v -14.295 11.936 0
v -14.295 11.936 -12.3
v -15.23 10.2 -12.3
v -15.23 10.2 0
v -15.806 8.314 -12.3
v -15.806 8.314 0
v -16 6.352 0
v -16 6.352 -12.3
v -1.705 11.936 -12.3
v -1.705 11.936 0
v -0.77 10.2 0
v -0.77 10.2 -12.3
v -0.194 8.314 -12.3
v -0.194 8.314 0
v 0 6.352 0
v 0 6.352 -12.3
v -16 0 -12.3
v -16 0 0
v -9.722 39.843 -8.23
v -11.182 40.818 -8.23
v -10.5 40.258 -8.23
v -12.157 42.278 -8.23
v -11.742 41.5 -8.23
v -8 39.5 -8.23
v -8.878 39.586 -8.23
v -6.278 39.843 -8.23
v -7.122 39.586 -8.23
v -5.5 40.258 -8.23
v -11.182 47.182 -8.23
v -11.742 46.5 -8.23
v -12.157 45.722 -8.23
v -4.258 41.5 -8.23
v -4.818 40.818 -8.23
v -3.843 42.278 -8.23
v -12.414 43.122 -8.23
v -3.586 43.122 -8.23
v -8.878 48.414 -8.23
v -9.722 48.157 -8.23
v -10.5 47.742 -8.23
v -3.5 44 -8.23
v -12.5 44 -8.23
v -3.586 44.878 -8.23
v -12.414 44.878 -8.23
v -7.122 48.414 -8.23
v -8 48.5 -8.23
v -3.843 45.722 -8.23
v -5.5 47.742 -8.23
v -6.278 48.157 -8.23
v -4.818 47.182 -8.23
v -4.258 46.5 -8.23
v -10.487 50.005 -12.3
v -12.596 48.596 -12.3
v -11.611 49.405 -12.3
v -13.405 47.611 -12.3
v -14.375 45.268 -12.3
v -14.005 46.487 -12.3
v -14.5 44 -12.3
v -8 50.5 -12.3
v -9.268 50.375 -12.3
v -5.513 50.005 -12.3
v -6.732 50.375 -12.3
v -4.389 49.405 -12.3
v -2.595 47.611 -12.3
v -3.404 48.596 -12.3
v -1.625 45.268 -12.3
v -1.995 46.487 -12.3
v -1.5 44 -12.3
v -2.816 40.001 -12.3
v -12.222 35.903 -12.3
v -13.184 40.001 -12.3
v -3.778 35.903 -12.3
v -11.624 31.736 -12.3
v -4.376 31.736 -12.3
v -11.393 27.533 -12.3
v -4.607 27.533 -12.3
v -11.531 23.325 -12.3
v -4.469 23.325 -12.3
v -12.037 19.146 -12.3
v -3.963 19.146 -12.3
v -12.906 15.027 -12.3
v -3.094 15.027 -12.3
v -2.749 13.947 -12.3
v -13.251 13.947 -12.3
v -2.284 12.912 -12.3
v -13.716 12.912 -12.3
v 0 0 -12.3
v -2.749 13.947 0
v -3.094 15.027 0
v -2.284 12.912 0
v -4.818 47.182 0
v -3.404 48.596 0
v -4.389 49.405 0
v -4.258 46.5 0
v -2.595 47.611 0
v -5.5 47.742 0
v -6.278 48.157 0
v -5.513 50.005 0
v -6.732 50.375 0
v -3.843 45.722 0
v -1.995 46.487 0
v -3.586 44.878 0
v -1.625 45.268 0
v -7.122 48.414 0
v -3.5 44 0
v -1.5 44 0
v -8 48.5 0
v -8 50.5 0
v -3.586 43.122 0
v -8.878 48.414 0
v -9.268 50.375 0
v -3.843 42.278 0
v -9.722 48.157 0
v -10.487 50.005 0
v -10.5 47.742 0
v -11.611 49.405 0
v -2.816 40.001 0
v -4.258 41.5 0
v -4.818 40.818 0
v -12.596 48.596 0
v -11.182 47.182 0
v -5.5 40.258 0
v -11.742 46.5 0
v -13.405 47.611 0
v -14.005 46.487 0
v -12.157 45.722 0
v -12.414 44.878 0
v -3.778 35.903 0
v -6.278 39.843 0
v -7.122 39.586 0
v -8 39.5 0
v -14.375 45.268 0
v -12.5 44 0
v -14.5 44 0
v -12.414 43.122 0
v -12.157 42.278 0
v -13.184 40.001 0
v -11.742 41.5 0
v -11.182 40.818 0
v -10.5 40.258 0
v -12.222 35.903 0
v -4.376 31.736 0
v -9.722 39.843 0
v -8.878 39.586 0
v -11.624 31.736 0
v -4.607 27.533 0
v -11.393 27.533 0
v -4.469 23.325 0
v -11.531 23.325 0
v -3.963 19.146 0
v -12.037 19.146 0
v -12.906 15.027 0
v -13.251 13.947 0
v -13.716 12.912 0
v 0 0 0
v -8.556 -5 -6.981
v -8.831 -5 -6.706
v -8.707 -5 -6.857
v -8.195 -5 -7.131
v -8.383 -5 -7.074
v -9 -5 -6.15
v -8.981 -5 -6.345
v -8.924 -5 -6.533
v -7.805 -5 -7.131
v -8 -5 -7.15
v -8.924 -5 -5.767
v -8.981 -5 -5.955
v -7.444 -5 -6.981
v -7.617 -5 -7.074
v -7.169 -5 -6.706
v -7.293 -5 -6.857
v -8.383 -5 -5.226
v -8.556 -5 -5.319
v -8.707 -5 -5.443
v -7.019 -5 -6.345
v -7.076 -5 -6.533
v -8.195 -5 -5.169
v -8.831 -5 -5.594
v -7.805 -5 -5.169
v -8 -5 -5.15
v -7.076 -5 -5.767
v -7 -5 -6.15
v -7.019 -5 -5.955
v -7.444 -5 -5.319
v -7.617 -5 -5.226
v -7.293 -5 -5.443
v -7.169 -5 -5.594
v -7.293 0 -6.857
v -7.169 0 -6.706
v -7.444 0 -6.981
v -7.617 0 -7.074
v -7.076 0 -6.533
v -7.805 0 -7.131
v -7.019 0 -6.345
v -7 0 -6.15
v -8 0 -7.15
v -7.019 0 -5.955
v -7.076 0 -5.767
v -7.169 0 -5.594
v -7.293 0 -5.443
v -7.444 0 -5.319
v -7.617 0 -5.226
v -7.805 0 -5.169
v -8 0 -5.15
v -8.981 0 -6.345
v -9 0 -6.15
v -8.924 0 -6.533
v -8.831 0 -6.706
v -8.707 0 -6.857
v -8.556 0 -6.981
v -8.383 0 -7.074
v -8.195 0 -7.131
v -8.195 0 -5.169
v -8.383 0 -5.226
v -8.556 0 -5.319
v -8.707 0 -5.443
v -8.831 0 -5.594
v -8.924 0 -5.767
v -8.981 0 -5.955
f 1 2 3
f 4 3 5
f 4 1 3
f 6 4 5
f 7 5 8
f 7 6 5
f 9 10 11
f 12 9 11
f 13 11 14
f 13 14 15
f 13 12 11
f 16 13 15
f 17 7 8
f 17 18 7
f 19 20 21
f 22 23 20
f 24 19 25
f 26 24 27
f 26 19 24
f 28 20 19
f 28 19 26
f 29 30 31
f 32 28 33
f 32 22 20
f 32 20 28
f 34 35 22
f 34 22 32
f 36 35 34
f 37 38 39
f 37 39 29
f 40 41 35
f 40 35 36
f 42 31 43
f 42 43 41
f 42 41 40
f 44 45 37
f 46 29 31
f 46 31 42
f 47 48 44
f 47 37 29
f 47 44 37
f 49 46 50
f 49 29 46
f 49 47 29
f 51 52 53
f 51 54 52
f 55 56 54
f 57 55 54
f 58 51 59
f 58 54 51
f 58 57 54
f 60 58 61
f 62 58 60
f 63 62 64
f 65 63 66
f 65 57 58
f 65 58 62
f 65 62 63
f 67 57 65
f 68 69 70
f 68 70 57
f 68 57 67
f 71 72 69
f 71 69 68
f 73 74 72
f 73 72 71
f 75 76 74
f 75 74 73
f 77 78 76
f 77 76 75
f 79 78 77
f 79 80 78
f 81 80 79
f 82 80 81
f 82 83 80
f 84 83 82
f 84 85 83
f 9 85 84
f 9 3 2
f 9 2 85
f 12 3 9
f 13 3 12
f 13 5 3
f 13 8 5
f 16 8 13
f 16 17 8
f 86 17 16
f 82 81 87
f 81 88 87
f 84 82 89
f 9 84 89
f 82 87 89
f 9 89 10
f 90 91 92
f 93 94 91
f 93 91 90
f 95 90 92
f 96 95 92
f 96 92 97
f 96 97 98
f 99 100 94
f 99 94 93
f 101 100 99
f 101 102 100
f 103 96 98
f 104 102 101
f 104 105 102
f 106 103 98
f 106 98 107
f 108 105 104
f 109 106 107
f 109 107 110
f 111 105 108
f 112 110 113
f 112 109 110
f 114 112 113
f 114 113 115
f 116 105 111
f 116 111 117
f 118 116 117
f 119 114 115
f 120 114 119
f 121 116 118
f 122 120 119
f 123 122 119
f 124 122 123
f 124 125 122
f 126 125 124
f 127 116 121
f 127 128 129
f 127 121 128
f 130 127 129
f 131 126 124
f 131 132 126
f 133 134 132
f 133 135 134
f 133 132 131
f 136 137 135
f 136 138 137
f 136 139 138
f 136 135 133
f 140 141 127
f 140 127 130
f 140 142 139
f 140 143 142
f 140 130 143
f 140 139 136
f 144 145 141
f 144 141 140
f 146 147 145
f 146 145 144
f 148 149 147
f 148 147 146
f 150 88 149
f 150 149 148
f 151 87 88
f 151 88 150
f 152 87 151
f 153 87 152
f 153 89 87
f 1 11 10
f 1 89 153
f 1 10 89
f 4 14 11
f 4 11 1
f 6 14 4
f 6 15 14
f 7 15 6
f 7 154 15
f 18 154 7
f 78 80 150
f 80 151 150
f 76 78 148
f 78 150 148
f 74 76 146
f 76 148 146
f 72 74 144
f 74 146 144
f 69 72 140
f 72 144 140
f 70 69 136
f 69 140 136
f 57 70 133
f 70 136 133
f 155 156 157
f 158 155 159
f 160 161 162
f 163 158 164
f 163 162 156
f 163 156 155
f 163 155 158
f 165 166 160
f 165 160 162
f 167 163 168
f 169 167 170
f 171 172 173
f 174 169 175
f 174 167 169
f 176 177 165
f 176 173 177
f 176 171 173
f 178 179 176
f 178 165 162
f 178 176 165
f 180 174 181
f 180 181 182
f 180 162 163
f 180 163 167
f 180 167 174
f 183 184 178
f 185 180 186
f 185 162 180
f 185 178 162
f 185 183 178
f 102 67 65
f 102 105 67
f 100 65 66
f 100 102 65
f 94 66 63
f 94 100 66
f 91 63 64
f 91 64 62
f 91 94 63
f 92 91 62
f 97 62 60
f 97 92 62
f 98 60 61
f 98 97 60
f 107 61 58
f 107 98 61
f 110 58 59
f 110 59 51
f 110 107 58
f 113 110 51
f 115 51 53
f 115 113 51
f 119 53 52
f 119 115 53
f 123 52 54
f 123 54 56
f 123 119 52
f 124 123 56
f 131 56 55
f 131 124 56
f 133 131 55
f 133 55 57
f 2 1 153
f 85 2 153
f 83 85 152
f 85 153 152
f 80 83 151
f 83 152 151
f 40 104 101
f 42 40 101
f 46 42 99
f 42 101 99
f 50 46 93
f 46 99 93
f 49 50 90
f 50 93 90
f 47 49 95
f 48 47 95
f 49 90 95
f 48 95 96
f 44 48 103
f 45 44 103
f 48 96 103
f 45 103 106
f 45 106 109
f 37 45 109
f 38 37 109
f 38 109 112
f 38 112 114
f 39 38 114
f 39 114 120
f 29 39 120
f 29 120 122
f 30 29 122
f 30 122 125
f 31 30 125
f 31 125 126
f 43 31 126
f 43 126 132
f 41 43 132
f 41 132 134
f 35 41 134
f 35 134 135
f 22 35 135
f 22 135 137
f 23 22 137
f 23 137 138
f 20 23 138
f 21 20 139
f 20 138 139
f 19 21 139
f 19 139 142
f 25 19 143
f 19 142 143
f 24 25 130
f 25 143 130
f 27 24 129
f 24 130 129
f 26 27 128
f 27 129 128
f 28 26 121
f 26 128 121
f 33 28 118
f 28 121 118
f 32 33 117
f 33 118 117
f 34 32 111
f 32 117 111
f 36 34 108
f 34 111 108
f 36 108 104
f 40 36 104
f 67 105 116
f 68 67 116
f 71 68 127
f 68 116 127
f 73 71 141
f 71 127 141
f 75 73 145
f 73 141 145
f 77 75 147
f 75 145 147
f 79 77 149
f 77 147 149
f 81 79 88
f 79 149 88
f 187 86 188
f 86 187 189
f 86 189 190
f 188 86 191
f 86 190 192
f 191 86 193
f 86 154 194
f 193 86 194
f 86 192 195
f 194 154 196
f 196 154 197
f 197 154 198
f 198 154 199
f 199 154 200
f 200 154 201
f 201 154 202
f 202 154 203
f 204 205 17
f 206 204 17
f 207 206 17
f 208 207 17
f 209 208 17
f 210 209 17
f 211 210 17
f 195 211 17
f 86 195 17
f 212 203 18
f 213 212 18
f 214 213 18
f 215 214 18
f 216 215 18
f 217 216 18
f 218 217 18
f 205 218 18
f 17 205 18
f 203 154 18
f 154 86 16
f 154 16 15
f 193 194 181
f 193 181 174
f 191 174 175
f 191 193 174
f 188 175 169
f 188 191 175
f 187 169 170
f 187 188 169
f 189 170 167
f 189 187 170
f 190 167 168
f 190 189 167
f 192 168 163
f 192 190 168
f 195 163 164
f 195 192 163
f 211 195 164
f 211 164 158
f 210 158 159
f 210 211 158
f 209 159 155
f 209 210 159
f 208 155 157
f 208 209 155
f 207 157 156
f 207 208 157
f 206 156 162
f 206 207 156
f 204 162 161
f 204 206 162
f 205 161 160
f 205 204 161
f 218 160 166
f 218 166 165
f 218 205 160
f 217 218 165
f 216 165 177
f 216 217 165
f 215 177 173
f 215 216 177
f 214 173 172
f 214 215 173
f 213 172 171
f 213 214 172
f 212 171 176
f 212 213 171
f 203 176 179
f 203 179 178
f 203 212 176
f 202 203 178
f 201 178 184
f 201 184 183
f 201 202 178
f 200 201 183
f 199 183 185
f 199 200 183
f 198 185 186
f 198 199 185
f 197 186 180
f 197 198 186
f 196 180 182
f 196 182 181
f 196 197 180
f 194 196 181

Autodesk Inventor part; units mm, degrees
ref_plane "YZ Plane" through (0, 0, 0) normal (1, 0, 0) x (0, 1, 0)
ref_plane "XZ Plane" through (0, 0, 0) normal (0, 1, 0) x (-1, 0, 0)
ref_plane "XY Plane" through (0, 0, 0) normal (0, 0, 1) x (1, 0, 0)
sketch "Sketch1" plane through (0, 0, 0) normal (0, 1, 0) x (-1, 0, 0)
  line L0 (0, 0) -> (16, 0)
  line L1 (16, 0) -> (16, -12.3)
  line L2 (16, -12.3) -> (0, -12.3)
  line L3 (0, -12.3) -> (0, 0)
  dimension "d0" = 16
  dimension "d1" = 12.3
extrude "Extrusion1" add sketch "Sketch1" along normal blind 10
sketch "Sketch2" plane through (0, 10, 0) normal (0, 1, 0) x (1, 0, 0)
  line L0 (-16, 0) -> (0, 0) projected
  line L1 (-8, 0) -> (-8, 12.3)
  line L2 (0, 12.3) -> (-16, 12.3) projected
  line L3 (-14.5, 0) -> (-14.5, 12.3)
  line L4 (-1.5, 0) -> (-1.5, 12.3)
  dimension "d4" = 6.5
  dimension "d5" = 6.5
extrude "Extrusion2" add sketch "Sketch2" along normal blind 40.5
sketch "Sketch3" plane through (-16, 0, 0) normal (0, 0, 1) x (1, 0, 0)
  line L0 (14.5, 50.5) -> (1.5, 50.5) projected
  line L1 (8, 50.5) -> (8, 0)
  line L2 (0, 0) -> (16, 0) projected
  circle A0 centre (8, 44) radius 4.5
  line L3 (1.5, 50.5) -> (14.5, 50.5) projected
  circle A1 centre (8, 44) radius 6.5
  line L4 (14.5, 10) -> (14.5, 50.5) projected
  line L5 (14.5, 30.25) -> (1.5, 30.25)
  line L6 (1.5, 10) -> (1.5, 50.5) projected
  line L7 (8, 30.25) -> (11.5, 30.25)
  arc A2 (14.5, 44) -> (14.5, 10) centre (59.4062, 27) ccw
  line L8 (8, 30.25) -> (4.5, 30.25)
  arc A3 (1.5, 10) -> (1.5, 44) centre (-43.4062, 27) ccw
  dimension "d8" = 6.5
  dimension "d9" = 9
  dimension "d10" = 13
  dimension "d11" = 3.5
  dimension "d12" = 3.5
extrude "Extrusion3" cut sketch "Sketch3" against normal blind 13.5 contours L4 A1 L0 | A1 L6 L0 | L4 L5 A2 A1 | A1 A2 | A3 A1 | A1 A3 L5 L6 | L4 A2 L5 | L5 A3 L6
fillet "Fillet1" radius 10 4 edges at (0, 10, -6.15) (-1.5, 10, -6.15) (-14.5, 10, -6.15) (-16, 10, -6.15)
sketch "Sketch4" plane through (-16, 0, 0) normal (0, 0, 1) x (1, 0, 0)
  arc A0 (14.5, 44) -> (1.5, 44) centre (8, 44) ccw projected
  circle A1 centre (8, 44) radius 4.5
  point P0 (16, 0)
  dimension "d16" = 9
extrude "Extrusion4" cut sketch "Sketch4" against normal blind 8.23
sketch "Sketch5" plane through (0, 0, 0) normal (0, -1, 0) x (1, 0, 0)
  line L0 (-16, 0) -> (0, 0) projected
  line L1 (-8, 0) -> (-8, -12.3)
  line L2 (0, -12.3) -> (-16, -12.3) projected
  circle A0 centre (-8, -6.15) radius 1
extrude "Extrusion5" add sketch "Sketch5" along normal blind 5
properties part number "pawn"
